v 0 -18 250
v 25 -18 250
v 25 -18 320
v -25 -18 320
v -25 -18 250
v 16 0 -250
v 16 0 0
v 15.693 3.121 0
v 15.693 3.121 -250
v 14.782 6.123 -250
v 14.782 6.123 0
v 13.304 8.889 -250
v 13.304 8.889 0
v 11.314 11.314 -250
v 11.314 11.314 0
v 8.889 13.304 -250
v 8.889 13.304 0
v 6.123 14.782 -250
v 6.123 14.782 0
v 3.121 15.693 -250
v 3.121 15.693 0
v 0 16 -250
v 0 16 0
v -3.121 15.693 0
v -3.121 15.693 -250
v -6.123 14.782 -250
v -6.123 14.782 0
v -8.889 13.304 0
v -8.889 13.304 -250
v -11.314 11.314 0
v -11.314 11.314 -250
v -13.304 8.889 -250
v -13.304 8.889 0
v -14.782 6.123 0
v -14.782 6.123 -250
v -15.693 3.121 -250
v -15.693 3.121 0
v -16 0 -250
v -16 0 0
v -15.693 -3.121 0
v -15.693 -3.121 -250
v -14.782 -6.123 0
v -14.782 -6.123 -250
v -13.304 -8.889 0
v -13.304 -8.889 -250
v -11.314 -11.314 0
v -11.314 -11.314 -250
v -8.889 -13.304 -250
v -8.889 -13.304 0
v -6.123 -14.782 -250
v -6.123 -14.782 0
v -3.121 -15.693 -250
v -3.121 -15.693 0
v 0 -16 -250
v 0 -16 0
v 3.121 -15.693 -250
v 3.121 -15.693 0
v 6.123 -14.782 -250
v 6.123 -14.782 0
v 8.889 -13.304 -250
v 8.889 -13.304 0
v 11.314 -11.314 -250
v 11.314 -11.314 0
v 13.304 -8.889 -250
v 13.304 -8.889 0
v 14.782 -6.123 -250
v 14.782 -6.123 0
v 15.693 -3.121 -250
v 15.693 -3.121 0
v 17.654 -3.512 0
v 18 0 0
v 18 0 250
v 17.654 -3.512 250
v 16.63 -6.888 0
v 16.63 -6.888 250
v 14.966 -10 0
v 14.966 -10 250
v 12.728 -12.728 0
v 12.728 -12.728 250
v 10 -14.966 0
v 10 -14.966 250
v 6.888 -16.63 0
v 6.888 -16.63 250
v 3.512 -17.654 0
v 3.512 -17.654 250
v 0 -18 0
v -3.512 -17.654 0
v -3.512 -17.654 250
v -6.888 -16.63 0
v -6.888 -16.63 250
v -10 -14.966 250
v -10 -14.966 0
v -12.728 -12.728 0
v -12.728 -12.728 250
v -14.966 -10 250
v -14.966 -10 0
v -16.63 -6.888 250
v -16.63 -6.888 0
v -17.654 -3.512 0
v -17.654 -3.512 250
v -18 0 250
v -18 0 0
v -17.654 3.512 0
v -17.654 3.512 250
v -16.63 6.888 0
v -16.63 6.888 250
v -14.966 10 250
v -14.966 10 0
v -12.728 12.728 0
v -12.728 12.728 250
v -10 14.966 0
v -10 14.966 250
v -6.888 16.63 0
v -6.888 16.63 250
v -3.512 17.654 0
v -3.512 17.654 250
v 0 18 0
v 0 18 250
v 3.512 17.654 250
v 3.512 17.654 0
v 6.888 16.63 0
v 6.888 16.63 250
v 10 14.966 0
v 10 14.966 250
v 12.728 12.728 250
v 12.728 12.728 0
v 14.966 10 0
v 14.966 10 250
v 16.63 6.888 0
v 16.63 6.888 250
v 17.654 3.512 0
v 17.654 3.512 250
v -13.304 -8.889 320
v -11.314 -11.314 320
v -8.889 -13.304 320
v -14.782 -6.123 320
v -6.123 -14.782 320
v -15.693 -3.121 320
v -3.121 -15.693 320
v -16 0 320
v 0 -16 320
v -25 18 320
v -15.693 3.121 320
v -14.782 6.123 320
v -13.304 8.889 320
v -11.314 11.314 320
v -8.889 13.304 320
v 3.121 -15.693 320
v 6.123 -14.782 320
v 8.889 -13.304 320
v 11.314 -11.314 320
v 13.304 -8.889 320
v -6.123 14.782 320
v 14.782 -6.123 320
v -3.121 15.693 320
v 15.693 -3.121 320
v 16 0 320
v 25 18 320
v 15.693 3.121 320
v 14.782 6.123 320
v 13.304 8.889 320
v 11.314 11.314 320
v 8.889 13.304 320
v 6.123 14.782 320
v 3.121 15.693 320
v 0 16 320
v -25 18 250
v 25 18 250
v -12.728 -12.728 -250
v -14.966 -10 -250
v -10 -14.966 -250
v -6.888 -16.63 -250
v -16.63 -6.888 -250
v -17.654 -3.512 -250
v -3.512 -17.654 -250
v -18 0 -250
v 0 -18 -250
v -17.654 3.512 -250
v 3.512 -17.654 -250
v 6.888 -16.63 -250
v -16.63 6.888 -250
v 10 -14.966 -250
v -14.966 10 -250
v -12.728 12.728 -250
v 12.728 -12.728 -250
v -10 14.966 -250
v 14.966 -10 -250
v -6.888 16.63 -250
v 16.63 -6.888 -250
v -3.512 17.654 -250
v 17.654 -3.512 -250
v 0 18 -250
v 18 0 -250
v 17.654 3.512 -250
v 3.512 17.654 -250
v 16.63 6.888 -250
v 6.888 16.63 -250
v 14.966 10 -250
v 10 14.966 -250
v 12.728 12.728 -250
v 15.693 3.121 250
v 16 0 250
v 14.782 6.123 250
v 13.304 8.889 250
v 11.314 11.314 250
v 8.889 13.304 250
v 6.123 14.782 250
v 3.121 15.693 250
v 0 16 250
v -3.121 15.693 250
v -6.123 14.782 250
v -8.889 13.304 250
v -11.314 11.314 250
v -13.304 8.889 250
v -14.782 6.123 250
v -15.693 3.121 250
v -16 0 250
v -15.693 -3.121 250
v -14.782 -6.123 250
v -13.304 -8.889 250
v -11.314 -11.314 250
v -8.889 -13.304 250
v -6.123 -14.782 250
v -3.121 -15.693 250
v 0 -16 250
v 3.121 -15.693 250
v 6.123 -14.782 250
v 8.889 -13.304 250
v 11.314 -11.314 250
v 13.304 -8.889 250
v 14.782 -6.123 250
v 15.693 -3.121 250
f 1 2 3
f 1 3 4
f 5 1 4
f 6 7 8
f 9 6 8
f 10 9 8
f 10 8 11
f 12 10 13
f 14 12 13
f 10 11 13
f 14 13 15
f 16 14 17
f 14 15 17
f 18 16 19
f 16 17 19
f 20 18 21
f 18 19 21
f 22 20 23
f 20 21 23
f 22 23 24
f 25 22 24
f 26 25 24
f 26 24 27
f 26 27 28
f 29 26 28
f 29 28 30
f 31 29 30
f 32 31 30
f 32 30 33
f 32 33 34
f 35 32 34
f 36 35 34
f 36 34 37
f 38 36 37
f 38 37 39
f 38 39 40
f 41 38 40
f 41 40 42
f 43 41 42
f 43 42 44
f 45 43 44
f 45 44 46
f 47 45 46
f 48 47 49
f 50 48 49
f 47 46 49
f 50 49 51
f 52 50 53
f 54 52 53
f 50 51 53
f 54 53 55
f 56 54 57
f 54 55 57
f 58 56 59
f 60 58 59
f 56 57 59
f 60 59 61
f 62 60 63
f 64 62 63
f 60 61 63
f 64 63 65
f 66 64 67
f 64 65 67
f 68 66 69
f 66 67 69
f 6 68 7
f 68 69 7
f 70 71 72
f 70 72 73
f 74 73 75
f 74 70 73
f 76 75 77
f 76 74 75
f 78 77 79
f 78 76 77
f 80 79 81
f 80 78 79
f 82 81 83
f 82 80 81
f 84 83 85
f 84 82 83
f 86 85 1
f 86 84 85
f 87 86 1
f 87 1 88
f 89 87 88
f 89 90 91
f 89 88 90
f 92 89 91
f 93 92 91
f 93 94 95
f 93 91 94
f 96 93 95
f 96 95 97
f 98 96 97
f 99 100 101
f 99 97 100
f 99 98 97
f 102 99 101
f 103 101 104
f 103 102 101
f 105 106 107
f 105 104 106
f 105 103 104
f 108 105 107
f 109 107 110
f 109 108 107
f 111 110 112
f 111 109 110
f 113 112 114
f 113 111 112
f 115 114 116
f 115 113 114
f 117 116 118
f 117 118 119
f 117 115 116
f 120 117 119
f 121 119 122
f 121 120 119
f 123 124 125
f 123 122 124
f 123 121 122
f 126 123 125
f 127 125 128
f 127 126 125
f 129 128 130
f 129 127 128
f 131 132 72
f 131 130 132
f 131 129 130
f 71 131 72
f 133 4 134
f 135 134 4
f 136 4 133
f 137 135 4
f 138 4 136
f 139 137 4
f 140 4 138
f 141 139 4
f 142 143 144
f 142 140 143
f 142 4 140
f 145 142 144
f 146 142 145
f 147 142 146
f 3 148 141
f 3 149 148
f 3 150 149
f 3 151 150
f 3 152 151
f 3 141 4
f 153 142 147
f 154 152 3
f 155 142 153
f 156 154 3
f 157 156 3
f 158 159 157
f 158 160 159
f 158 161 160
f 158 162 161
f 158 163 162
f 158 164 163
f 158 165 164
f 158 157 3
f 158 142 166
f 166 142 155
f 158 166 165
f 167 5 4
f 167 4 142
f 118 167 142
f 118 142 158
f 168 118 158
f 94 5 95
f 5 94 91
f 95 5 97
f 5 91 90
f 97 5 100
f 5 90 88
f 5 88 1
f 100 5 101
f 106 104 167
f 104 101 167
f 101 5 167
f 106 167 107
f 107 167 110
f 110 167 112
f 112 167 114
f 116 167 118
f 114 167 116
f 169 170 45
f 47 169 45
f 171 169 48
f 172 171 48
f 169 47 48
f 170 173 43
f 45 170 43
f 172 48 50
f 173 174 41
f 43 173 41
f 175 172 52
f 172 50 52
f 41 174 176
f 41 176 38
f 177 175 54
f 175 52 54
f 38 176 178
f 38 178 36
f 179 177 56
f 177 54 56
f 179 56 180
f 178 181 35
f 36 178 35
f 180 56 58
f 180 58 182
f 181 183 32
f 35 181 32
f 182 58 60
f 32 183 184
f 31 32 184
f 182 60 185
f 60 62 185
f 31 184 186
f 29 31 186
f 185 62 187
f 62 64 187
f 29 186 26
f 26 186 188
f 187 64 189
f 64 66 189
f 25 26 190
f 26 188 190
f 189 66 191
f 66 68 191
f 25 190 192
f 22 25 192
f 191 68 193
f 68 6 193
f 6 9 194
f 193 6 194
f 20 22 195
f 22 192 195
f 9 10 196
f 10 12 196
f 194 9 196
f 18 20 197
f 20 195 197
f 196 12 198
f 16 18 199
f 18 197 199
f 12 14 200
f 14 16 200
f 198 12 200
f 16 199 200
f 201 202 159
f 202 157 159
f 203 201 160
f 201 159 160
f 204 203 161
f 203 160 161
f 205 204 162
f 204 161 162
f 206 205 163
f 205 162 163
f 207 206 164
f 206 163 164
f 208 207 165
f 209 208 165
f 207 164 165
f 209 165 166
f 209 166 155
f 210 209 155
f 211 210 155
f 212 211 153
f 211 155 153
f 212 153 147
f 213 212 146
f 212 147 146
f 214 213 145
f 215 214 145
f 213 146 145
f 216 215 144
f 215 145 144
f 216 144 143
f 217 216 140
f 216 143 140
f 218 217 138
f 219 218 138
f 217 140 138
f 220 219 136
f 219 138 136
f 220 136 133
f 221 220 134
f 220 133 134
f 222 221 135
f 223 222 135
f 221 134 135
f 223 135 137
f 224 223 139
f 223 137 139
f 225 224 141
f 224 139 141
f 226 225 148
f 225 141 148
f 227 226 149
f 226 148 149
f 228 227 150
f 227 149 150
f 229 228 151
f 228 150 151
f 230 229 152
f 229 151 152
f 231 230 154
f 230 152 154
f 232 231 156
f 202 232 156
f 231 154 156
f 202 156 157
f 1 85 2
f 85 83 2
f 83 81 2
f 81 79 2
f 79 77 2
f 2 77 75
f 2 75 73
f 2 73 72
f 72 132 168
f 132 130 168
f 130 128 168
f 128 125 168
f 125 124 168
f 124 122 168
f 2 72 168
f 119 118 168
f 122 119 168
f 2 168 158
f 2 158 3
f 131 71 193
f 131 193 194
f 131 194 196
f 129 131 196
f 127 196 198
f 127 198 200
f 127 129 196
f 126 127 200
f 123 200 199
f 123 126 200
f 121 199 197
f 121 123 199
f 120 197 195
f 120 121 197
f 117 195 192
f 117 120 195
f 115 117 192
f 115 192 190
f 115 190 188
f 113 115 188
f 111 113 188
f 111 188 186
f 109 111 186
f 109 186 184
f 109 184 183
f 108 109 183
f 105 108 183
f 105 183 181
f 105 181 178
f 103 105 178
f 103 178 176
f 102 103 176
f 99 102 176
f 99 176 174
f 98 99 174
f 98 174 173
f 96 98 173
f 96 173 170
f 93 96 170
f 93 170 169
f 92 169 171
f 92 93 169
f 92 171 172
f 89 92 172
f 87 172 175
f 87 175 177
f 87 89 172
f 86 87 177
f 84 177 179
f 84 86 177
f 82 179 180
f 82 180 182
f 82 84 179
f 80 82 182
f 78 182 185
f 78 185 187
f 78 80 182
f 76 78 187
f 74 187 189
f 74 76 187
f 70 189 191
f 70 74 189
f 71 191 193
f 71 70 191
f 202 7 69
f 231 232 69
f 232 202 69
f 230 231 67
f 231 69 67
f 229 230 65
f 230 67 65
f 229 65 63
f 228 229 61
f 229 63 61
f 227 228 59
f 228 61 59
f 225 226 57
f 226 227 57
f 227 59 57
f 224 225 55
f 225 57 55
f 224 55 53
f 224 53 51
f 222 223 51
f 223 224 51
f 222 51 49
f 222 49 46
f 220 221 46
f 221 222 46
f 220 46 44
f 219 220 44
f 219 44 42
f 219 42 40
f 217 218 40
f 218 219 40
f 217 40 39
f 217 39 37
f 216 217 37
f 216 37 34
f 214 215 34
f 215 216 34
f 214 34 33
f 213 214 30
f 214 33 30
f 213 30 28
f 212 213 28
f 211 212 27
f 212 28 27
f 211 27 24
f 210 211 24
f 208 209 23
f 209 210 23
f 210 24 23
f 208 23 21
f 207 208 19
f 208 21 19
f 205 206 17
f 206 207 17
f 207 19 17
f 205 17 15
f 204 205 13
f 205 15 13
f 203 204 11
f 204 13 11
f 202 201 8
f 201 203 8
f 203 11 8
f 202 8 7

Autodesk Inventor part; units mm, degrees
ref_plane "YZ Plane" through (0, 0, 0) normal (1, 0, 0) x (0, 1, 0)
ref_plane "XZ Plane" through (0, 0, 0) normal (0, 1, 0) x (-1, 0, 0)
ref_plane "XY Plane" through (0, 0, 0) normal (0, 0, 1) x (1, 0, 0)
sketch "스케치1" plane through (0, 0, 0) normal (0, 0, 1) x (1, 0, 0)
  circle A0 centre (0, 0) radius 18
  circle A1 centre (0, 0) radius 16
  dimension "d0" = 36
  dimension "d1" = 32
extrude "돌출1" add sketch "스케치1" along normal mid plane 500
sketch "스케치2" plane through (0, 0, 250) normal (0, 0, 1) x (1, 0, 0)
  line L0 (-25, 18) -> (25, 18)
  line L1 (25, 18) -> (25, -18)
  line L2 (25, -18) -> (-25, -18)
  line L3 (-25, -18) -> (-25, 18)
  line L4 (-25, 18) -> (25, -18) construction
  line L5 (25, 18) -> (-25, -18) construction
  point P0 (0, 0)
  dimension "d4" = 50
extrude "돌출2" add sketch "스케치2" along normal blind 70
sketch "스케치3" plane through (0, 0, 320) normal (0, 0, 1) x (1, 0, 0)
  circle A0 centre (0, 0) radius 16
extrude "돌출3" cut sketch "스케치3" against normal blind 70
properties part number "motor_arm"
